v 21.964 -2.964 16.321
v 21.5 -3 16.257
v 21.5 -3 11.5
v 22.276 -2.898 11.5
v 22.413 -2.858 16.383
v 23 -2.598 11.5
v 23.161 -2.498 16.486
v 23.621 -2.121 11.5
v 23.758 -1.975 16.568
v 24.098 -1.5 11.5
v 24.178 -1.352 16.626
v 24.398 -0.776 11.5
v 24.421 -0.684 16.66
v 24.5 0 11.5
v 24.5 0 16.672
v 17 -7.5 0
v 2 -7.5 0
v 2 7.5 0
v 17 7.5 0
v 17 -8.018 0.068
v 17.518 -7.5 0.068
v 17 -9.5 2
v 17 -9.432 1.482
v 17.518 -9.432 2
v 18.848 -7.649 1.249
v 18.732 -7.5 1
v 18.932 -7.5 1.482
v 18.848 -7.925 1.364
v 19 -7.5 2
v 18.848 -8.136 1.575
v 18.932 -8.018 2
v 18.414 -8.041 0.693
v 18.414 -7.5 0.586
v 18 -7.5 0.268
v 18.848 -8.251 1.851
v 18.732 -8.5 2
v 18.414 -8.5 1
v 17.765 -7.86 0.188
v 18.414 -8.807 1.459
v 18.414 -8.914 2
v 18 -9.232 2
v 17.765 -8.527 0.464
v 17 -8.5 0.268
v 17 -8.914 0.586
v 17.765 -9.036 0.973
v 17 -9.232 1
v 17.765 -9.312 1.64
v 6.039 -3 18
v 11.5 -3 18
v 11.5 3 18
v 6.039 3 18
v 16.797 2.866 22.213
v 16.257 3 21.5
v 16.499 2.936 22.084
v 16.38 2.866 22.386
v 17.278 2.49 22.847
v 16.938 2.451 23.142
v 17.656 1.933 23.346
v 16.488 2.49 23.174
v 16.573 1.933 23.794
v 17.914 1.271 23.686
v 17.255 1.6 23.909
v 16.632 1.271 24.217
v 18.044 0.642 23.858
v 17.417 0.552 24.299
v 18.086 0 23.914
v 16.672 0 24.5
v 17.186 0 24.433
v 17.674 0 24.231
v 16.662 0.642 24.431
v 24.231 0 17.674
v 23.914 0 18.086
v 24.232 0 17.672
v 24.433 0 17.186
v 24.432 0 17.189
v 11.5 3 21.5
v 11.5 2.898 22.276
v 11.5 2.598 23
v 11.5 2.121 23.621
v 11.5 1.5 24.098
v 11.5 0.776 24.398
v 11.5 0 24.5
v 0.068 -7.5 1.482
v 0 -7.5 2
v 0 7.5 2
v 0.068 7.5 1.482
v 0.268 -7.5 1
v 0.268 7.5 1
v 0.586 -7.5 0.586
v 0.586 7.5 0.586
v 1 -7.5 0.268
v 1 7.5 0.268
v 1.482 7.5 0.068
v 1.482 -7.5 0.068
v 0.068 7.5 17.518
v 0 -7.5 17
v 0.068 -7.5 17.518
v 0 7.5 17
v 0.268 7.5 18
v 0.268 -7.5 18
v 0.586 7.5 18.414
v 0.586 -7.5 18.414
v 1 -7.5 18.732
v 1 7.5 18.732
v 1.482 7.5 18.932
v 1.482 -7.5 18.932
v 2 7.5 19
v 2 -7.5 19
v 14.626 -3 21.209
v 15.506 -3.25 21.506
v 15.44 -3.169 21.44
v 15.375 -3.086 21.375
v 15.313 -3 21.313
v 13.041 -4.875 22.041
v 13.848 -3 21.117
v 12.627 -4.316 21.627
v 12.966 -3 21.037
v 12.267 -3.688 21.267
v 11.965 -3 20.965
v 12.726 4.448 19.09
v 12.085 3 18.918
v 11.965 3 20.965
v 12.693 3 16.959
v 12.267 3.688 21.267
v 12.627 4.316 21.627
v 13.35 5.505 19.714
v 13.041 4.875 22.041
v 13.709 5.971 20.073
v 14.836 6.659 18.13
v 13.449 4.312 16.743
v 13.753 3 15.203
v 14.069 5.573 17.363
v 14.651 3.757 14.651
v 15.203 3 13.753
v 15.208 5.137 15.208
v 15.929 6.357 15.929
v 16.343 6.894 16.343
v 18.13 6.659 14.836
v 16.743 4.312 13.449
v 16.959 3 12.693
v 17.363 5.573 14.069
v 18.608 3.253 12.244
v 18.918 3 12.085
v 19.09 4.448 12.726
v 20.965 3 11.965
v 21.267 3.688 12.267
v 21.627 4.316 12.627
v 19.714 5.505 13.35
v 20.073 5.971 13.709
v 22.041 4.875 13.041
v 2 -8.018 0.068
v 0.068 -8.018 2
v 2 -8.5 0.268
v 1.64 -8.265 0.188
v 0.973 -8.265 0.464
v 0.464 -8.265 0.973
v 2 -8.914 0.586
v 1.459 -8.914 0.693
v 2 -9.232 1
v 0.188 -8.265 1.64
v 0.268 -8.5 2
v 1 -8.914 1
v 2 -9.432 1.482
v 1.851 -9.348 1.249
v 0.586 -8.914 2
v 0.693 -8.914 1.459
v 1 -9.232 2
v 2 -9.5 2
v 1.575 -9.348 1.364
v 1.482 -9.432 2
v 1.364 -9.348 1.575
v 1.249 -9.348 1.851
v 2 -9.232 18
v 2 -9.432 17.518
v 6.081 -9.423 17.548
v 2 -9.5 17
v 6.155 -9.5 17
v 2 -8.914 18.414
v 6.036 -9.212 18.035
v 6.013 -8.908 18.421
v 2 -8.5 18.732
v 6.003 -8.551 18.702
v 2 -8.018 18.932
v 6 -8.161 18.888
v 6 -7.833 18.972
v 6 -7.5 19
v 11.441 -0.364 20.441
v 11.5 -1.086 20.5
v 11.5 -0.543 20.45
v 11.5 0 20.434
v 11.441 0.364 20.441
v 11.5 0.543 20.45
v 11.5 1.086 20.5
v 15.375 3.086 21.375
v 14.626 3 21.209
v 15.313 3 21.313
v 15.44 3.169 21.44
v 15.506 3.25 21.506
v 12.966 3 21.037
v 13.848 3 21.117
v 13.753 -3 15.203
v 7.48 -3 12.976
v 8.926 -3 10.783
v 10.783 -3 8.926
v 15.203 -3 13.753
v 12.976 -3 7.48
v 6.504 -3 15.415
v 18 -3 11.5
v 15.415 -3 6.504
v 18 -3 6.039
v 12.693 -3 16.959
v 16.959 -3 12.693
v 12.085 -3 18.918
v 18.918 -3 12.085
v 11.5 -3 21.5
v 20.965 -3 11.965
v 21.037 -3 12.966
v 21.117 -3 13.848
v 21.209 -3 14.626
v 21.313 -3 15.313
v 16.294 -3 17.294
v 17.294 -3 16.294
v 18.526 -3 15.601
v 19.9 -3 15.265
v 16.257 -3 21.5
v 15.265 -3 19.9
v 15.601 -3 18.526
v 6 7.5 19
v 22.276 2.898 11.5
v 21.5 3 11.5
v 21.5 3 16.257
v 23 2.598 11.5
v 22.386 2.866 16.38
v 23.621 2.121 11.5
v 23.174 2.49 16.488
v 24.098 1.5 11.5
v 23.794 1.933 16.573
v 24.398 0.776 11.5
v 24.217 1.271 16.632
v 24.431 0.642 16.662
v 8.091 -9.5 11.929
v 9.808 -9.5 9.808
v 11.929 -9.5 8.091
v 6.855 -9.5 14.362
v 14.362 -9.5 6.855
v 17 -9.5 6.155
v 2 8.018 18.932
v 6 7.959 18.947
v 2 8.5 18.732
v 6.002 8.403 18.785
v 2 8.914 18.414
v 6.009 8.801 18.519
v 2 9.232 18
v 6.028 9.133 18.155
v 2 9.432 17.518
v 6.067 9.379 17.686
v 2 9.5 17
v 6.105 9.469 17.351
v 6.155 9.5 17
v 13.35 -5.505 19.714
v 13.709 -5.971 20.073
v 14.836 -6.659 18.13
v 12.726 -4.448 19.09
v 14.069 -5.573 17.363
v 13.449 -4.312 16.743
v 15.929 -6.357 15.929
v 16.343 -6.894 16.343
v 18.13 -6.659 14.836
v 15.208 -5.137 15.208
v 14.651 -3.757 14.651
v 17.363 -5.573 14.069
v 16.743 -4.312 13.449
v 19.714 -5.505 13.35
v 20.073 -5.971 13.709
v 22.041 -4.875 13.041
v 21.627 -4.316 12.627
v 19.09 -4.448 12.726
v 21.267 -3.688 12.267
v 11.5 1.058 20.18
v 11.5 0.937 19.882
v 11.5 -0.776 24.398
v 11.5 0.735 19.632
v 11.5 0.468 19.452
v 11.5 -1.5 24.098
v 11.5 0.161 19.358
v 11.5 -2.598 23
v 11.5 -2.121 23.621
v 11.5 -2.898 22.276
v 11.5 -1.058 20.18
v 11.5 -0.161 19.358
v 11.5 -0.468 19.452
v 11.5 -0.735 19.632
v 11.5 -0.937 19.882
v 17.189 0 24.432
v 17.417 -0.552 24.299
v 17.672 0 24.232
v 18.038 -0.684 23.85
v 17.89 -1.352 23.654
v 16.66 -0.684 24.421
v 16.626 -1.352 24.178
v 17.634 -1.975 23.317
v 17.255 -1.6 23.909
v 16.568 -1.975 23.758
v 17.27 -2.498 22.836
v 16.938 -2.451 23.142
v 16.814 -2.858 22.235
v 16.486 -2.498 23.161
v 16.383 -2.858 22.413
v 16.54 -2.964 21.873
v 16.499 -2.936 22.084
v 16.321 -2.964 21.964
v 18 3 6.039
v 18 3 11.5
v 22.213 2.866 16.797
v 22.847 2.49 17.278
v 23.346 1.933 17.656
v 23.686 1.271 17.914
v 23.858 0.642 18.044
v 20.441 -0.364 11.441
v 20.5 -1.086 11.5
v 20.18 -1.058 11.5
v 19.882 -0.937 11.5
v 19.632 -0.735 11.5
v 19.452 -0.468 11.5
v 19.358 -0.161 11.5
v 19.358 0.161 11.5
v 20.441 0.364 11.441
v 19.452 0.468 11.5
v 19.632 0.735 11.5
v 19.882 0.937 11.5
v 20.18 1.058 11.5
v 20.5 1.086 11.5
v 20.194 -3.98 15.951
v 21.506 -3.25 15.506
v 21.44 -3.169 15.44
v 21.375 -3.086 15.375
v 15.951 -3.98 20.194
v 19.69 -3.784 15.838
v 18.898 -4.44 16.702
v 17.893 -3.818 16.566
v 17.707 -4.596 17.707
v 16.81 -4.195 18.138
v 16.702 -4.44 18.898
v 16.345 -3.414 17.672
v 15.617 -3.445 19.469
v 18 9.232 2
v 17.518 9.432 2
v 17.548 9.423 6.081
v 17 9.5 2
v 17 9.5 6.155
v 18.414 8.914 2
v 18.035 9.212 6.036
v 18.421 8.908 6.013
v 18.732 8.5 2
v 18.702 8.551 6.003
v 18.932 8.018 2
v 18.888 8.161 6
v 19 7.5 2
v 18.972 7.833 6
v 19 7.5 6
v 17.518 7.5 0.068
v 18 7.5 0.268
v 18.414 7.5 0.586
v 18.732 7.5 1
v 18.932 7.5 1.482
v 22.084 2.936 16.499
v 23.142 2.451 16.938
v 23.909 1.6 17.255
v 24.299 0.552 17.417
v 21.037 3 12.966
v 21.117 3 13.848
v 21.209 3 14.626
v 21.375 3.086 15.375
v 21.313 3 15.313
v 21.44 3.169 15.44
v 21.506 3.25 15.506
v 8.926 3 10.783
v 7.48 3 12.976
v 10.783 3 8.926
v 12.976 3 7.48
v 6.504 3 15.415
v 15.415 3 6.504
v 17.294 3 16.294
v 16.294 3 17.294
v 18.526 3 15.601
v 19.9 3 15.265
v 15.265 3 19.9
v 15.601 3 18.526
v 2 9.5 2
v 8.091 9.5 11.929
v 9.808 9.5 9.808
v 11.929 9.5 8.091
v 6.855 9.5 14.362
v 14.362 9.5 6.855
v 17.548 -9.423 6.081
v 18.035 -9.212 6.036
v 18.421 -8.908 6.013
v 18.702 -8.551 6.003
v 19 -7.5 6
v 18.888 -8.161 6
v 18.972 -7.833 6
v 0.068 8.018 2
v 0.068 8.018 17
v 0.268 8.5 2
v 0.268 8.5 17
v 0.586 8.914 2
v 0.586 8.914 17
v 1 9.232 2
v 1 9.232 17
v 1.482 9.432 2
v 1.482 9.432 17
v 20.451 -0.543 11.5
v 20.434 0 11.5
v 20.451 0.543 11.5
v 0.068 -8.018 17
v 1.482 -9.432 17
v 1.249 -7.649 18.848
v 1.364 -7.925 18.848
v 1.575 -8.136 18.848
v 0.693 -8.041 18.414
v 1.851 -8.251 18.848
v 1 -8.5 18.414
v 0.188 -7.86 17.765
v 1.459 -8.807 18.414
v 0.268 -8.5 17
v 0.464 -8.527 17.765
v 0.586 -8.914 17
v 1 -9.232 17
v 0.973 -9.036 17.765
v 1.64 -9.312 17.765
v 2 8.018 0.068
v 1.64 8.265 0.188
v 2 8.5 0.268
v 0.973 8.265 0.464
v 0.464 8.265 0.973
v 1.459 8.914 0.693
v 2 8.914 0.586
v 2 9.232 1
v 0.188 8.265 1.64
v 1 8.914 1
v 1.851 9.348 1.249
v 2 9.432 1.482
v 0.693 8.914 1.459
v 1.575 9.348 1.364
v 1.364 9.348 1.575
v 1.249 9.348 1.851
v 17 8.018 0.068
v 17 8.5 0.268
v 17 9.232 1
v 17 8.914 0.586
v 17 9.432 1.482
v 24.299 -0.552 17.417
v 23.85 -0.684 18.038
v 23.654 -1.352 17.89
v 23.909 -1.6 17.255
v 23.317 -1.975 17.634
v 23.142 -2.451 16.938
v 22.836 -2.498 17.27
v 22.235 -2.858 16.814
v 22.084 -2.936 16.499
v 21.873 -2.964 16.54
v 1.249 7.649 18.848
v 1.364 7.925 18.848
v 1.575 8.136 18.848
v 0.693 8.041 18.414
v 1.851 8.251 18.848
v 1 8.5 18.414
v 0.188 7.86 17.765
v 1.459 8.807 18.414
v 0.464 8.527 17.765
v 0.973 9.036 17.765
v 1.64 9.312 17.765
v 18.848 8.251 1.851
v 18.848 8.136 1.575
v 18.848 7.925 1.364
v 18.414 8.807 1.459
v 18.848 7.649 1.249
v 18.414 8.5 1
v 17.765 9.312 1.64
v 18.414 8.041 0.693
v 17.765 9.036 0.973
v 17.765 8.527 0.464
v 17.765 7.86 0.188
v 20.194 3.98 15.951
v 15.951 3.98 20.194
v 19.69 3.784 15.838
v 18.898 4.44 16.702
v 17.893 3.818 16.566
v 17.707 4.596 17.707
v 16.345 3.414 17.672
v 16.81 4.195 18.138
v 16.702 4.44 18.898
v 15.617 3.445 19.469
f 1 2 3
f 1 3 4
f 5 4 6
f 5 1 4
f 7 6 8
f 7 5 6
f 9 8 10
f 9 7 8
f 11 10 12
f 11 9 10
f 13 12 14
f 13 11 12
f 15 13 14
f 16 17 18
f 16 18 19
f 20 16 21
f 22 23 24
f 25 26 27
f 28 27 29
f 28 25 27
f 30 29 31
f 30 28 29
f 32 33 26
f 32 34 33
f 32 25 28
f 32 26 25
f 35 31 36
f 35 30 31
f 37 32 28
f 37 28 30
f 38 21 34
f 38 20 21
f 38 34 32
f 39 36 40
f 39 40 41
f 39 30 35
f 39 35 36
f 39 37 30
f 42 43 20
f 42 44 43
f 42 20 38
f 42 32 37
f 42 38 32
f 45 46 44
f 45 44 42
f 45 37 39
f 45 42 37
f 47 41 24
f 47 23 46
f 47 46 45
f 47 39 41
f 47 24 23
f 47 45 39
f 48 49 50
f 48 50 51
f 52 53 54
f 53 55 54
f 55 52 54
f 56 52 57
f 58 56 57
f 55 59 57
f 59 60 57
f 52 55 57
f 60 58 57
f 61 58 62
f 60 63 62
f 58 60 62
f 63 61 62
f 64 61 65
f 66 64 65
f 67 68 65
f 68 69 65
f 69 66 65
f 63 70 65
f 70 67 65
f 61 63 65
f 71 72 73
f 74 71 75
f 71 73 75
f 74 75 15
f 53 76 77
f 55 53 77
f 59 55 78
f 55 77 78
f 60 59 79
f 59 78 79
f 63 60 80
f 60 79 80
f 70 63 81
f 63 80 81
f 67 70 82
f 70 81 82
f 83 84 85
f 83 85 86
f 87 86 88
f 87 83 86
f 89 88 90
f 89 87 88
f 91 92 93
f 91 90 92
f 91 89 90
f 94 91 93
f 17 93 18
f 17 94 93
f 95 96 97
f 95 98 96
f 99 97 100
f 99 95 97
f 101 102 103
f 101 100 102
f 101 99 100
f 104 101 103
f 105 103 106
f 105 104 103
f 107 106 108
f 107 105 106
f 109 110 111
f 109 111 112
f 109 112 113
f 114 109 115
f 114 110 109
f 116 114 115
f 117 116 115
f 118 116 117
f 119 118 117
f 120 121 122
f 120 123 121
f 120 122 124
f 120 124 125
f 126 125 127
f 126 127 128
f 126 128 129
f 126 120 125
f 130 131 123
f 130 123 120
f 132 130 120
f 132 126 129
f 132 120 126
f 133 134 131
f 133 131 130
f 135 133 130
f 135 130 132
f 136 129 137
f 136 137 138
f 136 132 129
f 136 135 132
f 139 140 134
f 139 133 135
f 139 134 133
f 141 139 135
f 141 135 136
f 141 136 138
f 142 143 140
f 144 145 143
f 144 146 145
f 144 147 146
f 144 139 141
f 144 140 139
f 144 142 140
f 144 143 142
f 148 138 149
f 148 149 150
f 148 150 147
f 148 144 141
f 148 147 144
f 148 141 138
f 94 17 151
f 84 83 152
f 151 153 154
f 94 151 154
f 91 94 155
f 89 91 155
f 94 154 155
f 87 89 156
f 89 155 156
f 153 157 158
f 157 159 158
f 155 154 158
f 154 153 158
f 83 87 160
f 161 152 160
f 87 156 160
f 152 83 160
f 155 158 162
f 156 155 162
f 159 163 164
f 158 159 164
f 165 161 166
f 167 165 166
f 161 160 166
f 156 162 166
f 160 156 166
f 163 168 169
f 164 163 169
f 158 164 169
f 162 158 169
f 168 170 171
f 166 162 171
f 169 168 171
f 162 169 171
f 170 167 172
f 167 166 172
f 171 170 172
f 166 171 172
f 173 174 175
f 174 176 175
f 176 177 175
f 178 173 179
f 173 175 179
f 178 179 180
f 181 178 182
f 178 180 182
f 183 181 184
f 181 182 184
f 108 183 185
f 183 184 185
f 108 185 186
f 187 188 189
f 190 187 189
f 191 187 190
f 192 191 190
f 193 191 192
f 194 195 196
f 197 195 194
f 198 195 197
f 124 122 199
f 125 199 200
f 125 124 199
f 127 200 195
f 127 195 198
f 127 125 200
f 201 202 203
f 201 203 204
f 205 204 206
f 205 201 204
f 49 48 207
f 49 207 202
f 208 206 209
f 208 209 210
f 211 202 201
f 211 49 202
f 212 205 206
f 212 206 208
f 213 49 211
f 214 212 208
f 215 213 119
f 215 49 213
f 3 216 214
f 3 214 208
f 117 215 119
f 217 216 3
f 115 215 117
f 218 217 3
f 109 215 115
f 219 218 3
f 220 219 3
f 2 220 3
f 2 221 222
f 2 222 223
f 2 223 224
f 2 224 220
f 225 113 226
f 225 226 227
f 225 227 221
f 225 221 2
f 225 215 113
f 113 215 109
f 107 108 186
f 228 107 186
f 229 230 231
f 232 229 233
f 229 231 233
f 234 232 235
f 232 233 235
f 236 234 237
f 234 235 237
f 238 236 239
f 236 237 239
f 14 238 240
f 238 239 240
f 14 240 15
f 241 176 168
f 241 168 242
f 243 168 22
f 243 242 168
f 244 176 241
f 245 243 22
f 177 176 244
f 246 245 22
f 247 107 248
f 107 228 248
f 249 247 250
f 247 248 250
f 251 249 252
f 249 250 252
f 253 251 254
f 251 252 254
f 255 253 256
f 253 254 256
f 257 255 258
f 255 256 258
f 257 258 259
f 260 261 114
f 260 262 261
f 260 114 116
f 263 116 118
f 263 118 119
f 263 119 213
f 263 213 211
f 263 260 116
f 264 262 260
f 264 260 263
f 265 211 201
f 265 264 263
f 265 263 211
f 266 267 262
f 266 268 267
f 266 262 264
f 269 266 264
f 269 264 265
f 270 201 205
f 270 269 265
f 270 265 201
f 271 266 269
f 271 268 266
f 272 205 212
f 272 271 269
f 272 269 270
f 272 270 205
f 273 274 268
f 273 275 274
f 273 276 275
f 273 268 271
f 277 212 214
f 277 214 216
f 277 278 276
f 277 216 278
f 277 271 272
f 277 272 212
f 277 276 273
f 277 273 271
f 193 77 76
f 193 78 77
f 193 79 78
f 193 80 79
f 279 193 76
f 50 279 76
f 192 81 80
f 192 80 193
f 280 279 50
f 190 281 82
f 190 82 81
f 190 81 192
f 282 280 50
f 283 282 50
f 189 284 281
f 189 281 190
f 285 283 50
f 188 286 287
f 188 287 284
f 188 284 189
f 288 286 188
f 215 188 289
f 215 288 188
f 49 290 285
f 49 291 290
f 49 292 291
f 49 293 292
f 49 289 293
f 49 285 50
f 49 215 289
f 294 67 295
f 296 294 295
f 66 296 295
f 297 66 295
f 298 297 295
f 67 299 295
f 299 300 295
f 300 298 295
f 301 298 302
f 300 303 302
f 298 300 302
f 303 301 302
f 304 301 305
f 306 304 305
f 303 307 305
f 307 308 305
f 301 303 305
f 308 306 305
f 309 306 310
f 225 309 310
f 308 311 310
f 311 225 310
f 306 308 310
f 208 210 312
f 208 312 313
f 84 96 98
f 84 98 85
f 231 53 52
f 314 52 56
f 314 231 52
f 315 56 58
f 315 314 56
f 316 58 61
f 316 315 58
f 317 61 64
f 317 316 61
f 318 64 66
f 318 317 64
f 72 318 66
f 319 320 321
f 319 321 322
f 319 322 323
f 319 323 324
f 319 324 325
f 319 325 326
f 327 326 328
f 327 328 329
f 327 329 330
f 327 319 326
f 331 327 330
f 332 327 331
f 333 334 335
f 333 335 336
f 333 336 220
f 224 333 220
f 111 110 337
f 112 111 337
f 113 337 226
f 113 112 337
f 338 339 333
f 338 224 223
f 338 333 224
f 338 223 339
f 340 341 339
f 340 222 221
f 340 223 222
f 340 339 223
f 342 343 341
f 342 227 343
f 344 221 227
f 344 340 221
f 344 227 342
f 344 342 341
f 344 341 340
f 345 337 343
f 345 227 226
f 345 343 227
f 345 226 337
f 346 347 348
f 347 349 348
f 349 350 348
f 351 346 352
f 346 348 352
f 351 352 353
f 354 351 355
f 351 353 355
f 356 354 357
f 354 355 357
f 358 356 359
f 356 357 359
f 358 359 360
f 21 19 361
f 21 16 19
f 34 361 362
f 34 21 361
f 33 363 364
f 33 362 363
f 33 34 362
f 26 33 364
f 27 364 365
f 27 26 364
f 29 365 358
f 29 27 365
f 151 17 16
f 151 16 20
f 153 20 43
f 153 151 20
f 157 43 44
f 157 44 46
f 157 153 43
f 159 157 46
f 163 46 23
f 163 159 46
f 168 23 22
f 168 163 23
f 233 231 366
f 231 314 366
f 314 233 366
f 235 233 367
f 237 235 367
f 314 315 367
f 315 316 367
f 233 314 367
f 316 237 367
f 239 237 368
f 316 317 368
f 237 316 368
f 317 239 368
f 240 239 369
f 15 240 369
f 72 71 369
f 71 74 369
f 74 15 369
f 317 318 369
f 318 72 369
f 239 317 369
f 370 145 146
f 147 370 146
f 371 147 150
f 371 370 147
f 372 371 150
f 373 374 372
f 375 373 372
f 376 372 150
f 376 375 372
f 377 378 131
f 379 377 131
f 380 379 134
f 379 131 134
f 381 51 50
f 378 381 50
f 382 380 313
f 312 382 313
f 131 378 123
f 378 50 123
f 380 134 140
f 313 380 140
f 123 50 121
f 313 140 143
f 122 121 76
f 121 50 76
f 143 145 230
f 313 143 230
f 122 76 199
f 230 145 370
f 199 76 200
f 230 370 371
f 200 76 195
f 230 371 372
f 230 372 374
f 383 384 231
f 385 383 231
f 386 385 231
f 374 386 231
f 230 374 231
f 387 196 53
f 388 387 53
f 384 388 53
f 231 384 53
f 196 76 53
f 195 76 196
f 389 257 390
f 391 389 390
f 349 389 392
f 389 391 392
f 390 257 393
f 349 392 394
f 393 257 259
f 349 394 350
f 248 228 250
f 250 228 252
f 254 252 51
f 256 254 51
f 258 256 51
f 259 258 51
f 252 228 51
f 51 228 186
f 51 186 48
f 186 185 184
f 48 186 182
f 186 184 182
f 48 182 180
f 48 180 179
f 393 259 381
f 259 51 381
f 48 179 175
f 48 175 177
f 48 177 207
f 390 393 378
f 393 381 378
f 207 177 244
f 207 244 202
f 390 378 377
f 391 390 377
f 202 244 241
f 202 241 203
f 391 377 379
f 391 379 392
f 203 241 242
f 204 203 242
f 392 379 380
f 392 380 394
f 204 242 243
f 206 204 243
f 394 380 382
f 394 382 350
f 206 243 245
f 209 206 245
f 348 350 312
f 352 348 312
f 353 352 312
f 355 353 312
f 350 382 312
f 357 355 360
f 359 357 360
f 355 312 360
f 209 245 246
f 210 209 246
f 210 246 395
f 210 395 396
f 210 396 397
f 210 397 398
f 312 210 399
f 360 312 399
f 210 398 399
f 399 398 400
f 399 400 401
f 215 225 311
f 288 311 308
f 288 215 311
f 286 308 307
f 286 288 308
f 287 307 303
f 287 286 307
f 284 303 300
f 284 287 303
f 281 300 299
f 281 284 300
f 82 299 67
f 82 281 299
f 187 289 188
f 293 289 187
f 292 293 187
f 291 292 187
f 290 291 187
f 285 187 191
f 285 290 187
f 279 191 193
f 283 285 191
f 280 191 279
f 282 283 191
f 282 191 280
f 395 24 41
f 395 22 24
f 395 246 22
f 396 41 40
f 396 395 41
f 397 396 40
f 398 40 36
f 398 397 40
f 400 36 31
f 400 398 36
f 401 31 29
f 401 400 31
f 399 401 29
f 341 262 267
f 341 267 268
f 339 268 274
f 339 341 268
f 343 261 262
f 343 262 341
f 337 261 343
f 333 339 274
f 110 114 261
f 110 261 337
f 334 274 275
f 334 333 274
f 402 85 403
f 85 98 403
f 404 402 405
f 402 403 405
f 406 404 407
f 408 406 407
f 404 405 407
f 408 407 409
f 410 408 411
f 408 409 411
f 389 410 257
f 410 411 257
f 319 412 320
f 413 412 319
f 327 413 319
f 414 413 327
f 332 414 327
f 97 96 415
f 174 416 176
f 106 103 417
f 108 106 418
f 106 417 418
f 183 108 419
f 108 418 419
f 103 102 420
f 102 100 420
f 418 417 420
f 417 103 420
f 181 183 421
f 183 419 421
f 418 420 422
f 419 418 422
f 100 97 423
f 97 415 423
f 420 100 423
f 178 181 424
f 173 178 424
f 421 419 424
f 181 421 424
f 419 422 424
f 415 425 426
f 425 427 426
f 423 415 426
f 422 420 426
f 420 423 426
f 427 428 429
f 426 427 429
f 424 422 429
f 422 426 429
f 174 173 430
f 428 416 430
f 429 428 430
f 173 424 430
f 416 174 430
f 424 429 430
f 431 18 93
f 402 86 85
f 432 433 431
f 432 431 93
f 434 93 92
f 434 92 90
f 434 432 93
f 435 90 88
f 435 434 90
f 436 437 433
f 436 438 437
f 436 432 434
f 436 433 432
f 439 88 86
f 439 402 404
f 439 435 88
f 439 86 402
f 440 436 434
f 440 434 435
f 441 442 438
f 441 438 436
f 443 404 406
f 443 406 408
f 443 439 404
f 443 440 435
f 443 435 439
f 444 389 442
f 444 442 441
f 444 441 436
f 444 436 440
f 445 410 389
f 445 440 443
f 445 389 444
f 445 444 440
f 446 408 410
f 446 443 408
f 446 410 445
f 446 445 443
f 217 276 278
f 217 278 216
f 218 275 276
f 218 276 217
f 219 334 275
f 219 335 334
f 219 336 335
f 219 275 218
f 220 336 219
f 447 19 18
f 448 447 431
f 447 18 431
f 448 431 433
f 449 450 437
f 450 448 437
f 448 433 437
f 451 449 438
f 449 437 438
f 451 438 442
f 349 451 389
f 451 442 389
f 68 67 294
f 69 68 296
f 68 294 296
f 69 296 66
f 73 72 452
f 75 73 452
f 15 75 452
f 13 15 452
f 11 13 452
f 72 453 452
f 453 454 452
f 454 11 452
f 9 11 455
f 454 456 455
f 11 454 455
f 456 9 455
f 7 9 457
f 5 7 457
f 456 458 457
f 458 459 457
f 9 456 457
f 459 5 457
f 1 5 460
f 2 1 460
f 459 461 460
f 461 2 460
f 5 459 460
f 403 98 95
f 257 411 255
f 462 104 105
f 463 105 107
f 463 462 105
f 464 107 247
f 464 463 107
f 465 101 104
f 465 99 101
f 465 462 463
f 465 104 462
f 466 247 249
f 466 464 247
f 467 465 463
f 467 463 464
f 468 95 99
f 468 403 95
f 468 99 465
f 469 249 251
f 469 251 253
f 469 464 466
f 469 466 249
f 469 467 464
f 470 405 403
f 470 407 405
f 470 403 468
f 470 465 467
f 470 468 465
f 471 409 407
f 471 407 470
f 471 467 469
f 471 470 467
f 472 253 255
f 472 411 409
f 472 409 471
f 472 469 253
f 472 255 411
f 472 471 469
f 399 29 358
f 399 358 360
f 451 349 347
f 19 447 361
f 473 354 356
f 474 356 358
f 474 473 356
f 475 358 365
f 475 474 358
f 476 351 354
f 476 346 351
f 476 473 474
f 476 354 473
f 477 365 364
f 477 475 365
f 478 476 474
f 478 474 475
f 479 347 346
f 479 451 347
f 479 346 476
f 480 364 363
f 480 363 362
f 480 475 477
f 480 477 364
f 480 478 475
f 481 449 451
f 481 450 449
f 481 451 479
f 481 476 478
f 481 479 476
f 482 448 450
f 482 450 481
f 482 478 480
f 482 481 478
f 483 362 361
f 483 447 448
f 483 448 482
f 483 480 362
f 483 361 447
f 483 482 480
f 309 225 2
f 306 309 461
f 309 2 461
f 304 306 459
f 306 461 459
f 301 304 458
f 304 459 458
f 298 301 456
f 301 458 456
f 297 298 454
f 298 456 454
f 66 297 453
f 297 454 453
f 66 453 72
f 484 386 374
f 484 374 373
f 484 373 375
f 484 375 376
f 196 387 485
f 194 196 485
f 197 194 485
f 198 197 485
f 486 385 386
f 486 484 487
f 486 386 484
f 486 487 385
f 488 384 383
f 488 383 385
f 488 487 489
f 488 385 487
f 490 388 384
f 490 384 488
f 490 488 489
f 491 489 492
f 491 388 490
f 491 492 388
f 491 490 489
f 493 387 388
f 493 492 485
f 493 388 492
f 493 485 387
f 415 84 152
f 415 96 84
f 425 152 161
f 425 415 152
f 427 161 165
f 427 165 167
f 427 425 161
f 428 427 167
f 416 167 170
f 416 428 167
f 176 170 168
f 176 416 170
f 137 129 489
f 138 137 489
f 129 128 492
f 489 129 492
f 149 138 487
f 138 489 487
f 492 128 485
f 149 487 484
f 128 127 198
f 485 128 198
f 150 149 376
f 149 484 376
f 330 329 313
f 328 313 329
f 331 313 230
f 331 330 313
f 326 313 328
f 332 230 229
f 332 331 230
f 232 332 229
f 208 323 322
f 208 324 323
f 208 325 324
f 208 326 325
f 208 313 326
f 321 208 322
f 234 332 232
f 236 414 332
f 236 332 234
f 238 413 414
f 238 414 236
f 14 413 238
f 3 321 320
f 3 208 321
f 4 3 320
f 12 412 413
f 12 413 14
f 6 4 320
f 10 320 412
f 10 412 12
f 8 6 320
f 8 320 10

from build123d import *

# Parameters (mm, degrees)
F0_W           = 19
F0_H           = 19
F1_DEPTH       = 9.5
F3_DEPTH       = 19.001
F5_DEPTH       = 3
F6_R           = 2
F8_DEPTH       = 12.501
F9_R           = 2
F10_R          = 2.99999
F11_R          = 2
F13_ANGLE_BACK = 50
F13_ANGLE      = 100


# Not quite as in the source:
# - a fillet or chamfer is up to 0.001 mm smaller than in the source, because OpenCascade refuses the exact size


with BuildPart() as f1:
    # F0 (on Front) → F1 (new body, symmetric)
    with BuildSketch(Plane.XZ):
        with Locations((9.5, 9.5)):
            Rectangle(F0_W, F0_H)
    extrude(amount=F1_DEPTH, both=True)

    # F2 (on face) → F3 (cut, through all)
    with BuildSketch(Plane.XZ.offset(9.5)):
        with BuildLine():
            ThreePointArc((6, 19), (9.8076118446, 9.8076118446), (19, 6))
            Line((19, 6), (19, 19))
            Line((19, 19), (6, 19))
        make_face()
    extrude(amount=-F3_DEPTH, mode=Mode.SUBTRACT)

    # F4 (on Front) → F5 (join, symmetric)
    with BuildSketch(Plane.XZ):
        Polygon((0, 18), (0, 0), (18, 0), (18, 11.5), (24.5, 11.5), (24.5, 24.5), (11.5, 24.5), (11.5, 18), align=None)
    extrude(amount=F5_DEPTH, both=True)

    # F6
    f6_edges = [f1.edges().sort_by_distance(p)[0] for p in [
        (0, 0, 0),
    ]]
    fillet(f6_edges, radius=F6_R)

    # F7 (on face) → F8 (cut, through all)
    with BuildSketch(Plane.XZ.offset(3)):
        Polygon((17.5, 24.5), (24.5, 17.5), (24.5, 24.5), align=None)
    extrude(amount=-F8_DEPTH, mode=Mode.SUBTRACT)

    # F9
    f9_edges = [f1.edges().sort_by_distance(p)[0] for p in [
        (0, -9.5, 10.5),
        (0, 9.5, 10.5),
        (0, 0, 19),
        (3, 9.5, 19),
        (3, -9.5, 19),
        (19, 9.5, 3),
        (19, 0, 0),
        (19, -9.5, 3),
    ]]
    fillet(f9_edges, radius=F9_R)

    # F10 (radius 3 in the source; OpenCascade refuses exactly that, so slightly less here)
    f10_edges = [f1.edges().sort_by_distance(p)[0] for p in [
        (14.5, -3, 24.5),
        (21, -3, 21),
        (24.5, -3, 14.5),
        (14.5, 3, 24.5),
        (21, 3, 21),
        (24.5, 3, 14.5),
    ]]
    fillet(f10_edges, radius=F10_R)

    # F11
    f11_edges = [f1.edges().sort_by_distance(p)[0] for p in [
        (17.118519, 2.162797, 23.579023),
        (23.579023, 2.162797, 17.118519),
    ]]
    fillet(f11_edges, radius=F11_R)

    # F12 (on Front) → F13 (revolve)
    with BuildSketch(Plane.XZ, mode=Mode.PRIVATE) as f13_sk:
        with BuildLine():
            Line((14.434, 20.434), (11.434, 20.434))
            ThreePointArc((11.434, 20.434), (14.0700389693, 14.0700389693), (20.434, 11.434))
            Line((20.434, 11.434), (20.434, 14.434))
            ThreePointArc((20.434, 14.434), (16.1913593129, 16.1913593129), (14.434, 20.434))
        make_face()
    revolve(f13_sk.sketch.rotate(Axis((20.434, 0, 20.434), (0.7071067812, 0, -0.7071067812)), -F13_ANGLE_BACK), axis=Axis((20.434, 0, 20.434), (0.7071067812, 0, -0.7071067812)), revolution_arc=F13_ANGLE)


solid = f1.part
